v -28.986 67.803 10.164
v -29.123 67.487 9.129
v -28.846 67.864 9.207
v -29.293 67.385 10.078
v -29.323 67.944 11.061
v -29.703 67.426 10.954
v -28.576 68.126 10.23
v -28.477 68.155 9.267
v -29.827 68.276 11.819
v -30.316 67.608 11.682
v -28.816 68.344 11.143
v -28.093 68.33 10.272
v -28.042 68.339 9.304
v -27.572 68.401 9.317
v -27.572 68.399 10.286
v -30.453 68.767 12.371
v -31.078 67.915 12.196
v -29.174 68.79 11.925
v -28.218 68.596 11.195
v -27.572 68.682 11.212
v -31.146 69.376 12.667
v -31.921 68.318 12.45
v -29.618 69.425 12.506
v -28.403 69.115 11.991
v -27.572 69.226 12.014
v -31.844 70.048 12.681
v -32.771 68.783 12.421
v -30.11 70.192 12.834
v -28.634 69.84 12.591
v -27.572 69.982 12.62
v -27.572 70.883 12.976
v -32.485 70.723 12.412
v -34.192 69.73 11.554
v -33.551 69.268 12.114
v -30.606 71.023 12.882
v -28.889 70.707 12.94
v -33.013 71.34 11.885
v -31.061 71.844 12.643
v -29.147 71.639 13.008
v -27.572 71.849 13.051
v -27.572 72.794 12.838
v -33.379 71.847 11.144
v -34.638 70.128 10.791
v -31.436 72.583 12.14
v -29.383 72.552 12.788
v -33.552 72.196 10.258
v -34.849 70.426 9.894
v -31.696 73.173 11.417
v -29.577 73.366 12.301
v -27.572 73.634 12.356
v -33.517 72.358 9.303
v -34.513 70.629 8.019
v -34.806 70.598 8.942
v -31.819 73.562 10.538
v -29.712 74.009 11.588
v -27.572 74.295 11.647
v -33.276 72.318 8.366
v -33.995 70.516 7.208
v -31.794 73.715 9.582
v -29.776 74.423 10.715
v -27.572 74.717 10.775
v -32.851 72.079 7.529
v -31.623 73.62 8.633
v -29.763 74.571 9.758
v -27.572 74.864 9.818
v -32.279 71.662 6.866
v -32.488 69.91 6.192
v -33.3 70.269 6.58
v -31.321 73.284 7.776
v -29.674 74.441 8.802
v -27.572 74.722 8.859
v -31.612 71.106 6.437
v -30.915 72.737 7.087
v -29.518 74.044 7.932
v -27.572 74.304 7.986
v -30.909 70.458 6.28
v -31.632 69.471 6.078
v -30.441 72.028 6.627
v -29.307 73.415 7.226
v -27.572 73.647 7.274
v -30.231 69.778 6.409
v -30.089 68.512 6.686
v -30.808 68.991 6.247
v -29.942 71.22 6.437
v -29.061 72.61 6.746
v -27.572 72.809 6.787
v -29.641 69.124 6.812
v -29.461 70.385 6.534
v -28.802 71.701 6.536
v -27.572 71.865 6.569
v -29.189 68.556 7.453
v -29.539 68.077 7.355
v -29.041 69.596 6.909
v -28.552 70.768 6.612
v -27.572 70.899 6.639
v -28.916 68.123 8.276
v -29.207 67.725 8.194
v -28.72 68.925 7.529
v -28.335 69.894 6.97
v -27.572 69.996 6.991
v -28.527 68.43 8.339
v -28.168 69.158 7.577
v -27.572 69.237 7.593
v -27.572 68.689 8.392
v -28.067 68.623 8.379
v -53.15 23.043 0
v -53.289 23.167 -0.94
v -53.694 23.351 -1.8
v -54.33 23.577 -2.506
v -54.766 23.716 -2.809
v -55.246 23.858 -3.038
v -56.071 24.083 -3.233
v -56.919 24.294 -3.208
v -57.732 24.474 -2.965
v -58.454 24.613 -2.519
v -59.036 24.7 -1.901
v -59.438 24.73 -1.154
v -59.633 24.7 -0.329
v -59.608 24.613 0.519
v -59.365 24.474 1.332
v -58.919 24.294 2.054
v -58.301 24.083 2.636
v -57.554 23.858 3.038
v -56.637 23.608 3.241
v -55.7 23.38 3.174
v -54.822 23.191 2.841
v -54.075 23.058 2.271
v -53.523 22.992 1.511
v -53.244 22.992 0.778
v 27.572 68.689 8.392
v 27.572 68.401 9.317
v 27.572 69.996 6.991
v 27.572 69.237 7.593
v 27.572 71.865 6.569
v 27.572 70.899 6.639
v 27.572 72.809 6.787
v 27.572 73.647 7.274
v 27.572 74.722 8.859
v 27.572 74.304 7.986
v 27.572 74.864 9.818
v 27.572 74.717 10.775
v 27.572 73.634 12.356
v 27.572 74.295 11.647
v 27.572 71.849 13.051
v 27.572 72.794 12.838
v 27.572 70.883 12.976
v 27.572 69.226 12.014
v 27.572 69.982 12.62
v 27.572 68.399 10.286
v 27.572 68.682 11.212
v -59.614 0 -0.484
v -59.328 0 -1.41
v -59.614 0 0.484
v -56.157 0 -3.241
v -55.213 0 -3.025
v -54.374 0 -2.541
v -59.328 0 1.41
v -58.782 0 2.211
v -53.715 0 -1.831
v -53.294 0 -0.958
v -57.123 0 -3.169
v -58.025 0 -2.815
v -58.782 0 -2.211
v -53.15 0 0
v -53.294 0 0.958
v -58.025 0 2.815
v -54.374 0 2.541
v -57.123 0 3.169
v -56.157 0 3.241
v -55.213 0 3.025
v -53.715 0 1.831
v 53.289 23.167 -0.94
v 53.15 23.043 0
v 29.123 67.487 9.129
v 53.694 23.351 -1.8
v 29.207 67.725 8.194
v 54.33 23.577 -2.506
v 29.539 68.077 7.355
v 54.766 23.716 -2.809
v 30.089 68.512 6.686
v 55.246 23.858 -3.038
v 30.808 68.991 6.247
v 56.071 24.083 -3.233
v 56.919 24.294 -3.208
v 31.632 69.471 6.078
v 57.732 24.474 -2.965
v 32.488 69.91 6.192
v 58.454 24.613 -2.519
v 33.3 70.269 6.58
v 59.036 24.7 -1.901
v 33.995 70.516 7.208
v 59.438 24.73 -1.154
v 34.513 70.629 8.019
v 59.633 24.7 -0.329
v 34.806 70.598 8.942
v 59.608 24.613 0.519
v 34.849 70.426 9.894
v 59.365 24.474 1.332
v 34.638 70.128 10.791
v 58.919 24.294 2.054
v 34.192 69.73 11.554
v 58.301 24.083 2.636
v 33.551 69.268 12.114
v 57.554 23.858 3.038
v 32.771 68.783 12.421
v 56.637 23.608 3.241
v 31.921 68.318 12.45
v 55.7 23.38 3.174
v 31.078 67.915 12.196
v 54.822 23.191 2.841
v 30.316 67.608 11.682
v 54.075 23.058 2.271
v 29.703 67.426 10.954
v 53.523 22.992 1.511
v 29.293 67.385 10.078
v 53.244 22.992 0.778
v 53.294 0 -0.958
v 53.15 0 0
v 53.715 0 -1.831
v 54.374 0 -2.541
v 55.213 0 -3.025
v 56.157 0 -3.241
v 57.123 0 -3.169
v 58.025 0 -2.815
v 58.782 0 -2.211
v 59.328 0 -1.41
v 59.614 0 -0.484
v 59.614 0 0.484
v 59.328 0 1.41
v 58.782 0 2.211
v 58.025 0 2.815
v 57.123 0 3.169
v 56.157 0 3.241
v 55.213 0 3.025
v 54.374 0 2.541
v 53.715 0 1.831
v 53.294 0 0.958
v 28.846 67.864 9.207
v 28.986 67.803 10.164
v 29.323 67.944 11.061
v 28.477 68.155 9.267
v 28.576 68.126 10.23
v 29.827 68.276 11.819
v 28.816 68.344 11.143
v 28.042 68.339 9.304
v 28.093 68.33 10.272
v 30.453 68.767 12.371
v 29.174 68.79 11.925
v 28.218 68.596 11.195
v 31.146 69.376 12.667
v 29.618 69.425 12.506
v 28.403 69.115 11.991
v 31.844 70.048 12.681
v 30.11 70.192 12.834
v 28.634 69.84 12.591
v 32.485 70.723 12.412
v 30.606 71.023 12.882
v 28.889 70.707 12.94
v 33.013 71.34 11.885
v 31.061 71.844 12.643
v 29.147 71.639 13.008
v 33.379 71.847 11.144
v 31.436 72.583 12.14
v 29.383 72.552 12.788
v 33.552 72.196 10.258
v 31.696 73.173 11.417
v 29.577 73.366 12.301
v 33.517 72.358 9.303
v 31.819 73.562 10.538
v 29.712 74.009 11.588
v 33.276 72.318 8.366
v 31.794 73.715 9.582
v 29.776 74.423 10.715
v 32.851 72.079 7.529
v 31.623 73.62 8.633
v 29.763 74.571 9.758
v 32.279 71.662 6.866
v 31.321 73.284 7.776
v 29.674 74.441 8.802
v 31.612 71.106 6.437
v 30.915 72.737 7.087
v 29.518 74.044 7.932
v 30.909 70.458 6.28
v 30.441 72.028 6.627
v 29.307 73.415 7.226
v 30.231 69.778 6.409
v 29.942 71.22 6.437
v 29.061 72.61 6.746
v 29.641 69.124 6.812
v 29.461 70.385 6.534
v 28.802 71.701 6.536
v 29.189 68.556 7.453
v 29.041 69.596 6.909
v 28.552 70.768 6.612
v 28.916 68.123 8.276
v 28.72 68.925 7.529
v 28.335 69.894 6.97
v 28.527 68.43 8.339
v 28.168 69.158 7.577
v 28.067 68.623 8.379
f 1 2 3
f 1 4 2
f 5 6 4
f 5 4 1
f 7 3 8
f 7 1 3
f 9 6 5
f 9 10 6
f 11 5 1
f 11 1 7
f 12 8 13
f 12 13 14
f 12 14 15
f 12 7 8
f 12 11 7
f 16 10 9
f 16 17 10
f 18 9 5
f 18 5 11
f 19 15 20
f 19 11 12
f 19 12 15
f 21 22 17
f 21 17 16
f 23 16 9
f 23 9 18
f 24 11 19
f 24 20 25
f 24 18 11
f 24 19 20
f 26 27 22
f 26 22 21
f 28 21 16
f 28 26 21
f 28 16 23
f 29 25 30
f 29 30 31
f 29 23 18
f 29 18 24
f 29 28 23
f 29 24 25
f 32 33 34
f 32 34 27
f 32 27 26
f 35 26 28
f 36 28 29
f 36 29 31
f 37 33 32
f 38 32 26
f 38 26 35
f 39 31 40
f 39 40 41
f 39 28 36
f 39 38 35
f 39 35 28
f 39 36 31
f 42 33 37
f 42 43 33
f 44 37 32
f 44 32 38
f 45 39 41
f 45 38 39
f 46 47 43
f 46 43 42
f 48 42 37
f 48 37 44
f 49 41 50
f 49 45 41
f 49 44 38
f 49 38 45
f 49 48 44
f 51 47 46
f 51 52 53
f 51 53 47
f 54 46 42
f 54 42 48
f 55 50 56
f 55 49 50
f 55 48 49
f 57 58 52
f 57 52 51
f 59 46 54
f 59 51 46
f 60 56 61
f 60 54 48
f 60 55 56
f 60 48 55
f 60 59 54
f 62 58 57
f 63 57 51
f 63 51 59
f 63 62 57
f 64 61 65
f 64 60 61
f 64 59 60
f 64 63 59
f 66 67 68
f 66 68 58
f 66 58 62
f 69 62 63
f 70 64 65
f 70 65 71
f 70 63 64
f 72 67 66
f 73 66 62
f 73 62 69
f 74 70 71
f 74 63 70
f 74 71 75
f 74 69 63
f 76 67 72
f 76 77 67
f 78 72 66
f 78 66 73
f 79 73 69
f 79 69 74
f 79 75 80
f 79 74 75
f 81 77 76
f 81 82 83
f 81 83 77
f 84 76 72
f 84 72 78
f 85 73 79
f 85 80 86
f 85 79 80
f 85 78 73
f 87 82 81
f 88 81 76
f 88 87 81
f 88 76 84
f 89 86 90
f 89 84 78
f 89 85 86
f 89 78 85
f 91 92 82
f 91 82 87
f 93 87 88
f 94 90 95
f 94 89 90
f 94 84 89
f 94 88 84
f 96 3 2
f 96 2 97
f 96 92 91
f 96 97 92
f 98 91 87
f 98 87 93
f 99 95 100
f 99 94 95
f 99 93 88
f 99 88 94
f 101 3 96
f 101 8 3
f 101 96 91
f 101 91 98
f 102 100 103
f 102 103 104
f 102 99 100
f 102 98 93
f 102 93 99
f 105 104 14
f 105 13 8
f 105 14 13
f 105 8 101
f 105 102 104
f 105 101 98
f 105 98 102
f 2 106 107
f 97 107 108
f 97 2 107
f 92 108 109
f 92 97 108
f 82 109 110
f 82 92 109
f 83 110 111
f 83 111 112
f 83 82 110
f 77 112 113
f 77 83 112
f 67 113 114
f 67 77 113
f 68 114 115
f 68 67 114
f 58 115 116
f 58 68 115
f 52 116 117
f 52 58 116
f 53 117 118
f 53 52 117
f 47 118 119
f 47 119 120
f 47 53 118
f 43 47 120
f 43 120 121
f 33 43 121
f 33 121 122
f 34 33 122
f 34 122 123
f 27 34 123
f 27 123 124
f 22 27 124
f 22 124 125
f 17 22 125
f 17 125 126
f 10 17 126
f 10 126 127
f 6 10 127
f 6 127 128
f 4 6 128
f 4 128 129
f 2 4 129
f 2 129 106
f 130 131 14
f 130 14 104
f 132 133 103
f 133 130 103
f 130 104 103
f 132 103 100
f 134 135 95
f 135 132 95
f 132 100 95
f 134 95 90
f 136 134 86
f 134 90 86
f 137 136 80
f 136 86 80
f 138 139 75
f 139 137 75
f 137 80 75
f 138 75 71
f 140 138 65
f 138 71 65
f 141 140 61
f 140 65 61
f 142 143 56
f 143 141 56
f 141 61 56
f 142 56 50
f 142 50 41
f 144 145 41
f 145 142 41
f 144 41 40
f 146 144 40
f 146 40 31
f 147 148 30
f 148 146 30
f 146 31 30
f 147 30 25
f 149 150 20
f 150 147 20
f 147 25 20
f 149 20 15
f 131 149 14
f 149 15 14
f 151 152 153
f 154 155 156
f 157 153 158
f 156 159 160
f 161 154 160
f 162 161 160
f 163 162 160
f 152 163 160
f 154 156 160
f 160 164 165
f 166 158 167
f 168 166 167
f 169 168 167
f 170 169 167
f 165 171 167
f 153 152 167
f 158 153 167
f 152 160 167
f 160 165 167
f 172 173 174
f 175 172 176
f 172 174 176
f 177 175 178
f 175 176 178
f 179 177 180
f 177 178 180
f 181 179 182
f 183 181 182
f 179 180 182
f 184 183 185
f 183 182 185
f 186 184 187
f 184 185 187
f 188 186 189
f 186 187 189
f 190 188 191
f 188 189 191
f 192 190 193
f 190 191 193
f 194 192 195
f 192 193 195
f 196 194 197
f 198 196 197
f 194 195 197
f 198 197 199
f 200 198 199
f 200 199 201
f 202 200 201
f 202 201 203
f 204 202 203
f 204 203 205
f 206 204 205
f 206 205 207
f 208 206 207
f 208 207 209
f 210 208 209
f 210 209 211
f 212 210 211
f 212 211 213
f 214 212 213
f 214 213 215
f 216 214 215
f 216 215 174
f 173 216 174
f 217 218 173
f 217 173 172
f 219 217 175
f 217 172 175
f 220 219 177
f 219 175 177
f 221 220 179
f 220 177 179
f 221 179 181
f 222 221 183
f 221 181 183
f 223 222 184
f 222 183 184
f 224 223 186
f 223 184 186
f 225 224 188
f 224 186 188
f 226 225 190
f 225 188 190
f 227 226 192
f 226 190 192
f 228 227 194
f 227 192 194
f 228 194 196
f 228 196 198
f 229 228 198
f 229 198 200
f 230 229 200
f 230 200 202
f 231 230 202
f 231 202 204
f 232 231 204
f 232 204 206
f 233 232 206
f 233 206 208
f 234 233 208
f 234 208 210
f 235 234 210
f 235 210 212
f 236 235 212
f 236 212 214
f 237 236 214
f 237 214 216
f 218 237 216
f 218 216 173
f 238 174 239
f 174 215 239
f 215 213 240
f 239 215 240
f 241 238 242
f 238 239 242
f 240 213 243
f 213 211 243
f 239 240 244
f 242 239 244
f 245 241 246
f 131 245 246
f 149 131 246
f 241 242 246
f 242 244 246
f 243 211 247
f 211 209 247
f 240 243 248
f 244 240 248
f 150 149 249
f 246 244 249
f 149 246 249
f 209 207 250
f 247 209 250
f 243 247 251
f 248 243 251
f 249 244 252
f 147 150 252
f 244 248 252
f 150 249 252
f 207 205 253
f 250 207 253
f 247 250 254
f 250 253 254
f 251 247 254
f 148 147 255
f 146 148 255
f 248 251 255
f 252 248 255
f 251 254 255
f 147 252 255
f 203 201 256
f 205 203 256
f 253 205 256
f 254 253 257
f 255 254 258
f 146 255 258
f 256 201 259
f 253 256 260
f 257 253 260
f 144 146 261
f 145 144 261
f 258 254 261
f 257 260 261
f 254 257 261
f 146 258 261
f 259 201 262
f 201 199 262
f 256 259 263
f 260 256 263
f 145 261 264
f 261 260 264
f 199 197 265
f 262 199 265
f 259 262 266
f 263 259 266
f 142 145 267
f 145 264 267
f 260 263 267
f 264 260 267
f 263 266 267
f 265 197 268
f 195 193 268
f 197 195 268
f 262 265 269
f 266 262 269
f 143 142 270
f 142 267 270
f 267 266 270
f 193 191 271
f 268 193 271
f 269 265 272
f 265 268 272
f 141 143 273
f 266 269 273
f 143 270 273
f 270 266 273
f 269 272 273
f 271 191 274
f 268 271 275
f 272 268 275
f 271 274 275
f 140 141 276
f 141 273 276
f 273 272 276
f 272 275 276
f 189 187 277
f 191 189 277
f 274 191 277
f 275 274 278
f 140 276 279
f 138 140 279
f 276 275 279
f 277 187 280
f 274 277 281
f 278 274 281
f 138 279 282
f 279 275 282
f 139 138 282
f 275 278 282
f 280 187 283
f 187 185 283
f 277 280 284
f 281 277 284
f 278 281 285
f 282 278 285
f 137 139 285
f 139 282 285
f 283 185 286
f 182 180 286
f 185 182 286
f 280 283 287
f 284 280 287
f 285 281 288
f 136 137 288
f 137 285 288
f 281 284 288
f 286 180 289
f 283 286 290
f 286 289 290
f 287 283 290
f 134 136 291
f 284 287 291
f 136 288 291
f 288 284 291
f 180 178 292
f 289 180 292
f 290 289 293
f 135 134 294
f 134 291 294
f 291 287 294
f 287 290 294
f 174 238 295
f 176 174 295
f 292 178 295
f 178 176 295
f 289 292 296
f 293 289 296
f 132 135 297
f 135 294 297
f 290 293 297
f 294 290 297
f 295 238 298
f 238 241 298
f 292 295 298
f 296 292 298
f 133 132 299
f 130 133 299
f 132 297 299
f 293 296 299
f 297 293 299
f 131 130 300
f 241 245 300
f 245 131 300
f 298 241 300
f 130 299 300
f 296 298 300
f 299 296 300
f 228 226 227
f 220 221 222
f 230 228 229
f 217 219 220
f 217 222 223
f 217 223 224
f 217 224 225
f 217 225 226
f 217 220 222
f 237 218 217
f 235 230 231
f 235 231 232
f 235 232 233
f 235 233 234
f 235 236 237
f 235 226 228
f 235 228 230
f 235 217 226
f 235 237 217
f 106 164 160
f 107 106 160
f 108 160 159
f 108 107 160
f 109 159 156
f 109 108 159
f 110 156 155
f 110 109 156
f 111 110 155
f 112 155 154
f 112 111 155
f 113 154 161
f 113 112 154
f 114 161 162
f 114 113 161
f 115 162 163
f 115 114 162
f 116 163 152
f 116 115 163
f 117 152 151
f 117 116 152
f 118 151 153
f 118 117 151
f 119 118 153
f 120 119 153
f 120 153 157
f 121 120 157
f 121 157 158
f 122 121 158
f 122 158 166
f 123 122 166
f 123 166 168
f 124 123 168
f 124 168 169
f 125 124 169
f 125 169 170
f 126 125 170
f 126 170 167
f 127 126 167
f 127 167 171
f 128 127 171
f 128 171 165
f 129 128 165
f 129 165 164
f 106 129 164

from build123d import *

# Parameters (mm, degrees)
CROQUIS2_R = 3.25


with BuildPart() as part:
    # Barrer2: sweep along a curve in space
    with BuildLine() as barrer2_path:
        Line((-27.572352062, 71.613970134, 9.809651149), (0, 71.613970134, 9.809651149))
        ThreePointArc((-31.991027423, 69.008310978, 9.274420134), (-30.151141692, 70.912292174, 9.665518788), (-27.572352062, 71.613970134, 9.809651149))
        Line((-56.4, 23.857755349, 0), (-31.991027423, 69.008310978, 9.274420134))
        Line((-56.4, 0, 0), (-56.4, 23.857755349, 0))
    # Croquis2 → Barrer2 (sweep)
    with BuildSketch(Plane(origin=(0, 0, 0), x_dir=(1, 0, 0), z_dir=(0, 1, 0))):
        with Locations((-56.4, 0)):
            Circle(CROQUIS2_R)
    barrer2 = sweep(path=barrer2_path.line, transition=Transition.RIGHT)

    # Simetría1: Barrer2 across Right Plane
    add(barrer2.mirror(Plane(origin=(0, 0, 0), x_dir=(0, 0, -1), z_dir=(1, 0, 0))))


solid = part.part
